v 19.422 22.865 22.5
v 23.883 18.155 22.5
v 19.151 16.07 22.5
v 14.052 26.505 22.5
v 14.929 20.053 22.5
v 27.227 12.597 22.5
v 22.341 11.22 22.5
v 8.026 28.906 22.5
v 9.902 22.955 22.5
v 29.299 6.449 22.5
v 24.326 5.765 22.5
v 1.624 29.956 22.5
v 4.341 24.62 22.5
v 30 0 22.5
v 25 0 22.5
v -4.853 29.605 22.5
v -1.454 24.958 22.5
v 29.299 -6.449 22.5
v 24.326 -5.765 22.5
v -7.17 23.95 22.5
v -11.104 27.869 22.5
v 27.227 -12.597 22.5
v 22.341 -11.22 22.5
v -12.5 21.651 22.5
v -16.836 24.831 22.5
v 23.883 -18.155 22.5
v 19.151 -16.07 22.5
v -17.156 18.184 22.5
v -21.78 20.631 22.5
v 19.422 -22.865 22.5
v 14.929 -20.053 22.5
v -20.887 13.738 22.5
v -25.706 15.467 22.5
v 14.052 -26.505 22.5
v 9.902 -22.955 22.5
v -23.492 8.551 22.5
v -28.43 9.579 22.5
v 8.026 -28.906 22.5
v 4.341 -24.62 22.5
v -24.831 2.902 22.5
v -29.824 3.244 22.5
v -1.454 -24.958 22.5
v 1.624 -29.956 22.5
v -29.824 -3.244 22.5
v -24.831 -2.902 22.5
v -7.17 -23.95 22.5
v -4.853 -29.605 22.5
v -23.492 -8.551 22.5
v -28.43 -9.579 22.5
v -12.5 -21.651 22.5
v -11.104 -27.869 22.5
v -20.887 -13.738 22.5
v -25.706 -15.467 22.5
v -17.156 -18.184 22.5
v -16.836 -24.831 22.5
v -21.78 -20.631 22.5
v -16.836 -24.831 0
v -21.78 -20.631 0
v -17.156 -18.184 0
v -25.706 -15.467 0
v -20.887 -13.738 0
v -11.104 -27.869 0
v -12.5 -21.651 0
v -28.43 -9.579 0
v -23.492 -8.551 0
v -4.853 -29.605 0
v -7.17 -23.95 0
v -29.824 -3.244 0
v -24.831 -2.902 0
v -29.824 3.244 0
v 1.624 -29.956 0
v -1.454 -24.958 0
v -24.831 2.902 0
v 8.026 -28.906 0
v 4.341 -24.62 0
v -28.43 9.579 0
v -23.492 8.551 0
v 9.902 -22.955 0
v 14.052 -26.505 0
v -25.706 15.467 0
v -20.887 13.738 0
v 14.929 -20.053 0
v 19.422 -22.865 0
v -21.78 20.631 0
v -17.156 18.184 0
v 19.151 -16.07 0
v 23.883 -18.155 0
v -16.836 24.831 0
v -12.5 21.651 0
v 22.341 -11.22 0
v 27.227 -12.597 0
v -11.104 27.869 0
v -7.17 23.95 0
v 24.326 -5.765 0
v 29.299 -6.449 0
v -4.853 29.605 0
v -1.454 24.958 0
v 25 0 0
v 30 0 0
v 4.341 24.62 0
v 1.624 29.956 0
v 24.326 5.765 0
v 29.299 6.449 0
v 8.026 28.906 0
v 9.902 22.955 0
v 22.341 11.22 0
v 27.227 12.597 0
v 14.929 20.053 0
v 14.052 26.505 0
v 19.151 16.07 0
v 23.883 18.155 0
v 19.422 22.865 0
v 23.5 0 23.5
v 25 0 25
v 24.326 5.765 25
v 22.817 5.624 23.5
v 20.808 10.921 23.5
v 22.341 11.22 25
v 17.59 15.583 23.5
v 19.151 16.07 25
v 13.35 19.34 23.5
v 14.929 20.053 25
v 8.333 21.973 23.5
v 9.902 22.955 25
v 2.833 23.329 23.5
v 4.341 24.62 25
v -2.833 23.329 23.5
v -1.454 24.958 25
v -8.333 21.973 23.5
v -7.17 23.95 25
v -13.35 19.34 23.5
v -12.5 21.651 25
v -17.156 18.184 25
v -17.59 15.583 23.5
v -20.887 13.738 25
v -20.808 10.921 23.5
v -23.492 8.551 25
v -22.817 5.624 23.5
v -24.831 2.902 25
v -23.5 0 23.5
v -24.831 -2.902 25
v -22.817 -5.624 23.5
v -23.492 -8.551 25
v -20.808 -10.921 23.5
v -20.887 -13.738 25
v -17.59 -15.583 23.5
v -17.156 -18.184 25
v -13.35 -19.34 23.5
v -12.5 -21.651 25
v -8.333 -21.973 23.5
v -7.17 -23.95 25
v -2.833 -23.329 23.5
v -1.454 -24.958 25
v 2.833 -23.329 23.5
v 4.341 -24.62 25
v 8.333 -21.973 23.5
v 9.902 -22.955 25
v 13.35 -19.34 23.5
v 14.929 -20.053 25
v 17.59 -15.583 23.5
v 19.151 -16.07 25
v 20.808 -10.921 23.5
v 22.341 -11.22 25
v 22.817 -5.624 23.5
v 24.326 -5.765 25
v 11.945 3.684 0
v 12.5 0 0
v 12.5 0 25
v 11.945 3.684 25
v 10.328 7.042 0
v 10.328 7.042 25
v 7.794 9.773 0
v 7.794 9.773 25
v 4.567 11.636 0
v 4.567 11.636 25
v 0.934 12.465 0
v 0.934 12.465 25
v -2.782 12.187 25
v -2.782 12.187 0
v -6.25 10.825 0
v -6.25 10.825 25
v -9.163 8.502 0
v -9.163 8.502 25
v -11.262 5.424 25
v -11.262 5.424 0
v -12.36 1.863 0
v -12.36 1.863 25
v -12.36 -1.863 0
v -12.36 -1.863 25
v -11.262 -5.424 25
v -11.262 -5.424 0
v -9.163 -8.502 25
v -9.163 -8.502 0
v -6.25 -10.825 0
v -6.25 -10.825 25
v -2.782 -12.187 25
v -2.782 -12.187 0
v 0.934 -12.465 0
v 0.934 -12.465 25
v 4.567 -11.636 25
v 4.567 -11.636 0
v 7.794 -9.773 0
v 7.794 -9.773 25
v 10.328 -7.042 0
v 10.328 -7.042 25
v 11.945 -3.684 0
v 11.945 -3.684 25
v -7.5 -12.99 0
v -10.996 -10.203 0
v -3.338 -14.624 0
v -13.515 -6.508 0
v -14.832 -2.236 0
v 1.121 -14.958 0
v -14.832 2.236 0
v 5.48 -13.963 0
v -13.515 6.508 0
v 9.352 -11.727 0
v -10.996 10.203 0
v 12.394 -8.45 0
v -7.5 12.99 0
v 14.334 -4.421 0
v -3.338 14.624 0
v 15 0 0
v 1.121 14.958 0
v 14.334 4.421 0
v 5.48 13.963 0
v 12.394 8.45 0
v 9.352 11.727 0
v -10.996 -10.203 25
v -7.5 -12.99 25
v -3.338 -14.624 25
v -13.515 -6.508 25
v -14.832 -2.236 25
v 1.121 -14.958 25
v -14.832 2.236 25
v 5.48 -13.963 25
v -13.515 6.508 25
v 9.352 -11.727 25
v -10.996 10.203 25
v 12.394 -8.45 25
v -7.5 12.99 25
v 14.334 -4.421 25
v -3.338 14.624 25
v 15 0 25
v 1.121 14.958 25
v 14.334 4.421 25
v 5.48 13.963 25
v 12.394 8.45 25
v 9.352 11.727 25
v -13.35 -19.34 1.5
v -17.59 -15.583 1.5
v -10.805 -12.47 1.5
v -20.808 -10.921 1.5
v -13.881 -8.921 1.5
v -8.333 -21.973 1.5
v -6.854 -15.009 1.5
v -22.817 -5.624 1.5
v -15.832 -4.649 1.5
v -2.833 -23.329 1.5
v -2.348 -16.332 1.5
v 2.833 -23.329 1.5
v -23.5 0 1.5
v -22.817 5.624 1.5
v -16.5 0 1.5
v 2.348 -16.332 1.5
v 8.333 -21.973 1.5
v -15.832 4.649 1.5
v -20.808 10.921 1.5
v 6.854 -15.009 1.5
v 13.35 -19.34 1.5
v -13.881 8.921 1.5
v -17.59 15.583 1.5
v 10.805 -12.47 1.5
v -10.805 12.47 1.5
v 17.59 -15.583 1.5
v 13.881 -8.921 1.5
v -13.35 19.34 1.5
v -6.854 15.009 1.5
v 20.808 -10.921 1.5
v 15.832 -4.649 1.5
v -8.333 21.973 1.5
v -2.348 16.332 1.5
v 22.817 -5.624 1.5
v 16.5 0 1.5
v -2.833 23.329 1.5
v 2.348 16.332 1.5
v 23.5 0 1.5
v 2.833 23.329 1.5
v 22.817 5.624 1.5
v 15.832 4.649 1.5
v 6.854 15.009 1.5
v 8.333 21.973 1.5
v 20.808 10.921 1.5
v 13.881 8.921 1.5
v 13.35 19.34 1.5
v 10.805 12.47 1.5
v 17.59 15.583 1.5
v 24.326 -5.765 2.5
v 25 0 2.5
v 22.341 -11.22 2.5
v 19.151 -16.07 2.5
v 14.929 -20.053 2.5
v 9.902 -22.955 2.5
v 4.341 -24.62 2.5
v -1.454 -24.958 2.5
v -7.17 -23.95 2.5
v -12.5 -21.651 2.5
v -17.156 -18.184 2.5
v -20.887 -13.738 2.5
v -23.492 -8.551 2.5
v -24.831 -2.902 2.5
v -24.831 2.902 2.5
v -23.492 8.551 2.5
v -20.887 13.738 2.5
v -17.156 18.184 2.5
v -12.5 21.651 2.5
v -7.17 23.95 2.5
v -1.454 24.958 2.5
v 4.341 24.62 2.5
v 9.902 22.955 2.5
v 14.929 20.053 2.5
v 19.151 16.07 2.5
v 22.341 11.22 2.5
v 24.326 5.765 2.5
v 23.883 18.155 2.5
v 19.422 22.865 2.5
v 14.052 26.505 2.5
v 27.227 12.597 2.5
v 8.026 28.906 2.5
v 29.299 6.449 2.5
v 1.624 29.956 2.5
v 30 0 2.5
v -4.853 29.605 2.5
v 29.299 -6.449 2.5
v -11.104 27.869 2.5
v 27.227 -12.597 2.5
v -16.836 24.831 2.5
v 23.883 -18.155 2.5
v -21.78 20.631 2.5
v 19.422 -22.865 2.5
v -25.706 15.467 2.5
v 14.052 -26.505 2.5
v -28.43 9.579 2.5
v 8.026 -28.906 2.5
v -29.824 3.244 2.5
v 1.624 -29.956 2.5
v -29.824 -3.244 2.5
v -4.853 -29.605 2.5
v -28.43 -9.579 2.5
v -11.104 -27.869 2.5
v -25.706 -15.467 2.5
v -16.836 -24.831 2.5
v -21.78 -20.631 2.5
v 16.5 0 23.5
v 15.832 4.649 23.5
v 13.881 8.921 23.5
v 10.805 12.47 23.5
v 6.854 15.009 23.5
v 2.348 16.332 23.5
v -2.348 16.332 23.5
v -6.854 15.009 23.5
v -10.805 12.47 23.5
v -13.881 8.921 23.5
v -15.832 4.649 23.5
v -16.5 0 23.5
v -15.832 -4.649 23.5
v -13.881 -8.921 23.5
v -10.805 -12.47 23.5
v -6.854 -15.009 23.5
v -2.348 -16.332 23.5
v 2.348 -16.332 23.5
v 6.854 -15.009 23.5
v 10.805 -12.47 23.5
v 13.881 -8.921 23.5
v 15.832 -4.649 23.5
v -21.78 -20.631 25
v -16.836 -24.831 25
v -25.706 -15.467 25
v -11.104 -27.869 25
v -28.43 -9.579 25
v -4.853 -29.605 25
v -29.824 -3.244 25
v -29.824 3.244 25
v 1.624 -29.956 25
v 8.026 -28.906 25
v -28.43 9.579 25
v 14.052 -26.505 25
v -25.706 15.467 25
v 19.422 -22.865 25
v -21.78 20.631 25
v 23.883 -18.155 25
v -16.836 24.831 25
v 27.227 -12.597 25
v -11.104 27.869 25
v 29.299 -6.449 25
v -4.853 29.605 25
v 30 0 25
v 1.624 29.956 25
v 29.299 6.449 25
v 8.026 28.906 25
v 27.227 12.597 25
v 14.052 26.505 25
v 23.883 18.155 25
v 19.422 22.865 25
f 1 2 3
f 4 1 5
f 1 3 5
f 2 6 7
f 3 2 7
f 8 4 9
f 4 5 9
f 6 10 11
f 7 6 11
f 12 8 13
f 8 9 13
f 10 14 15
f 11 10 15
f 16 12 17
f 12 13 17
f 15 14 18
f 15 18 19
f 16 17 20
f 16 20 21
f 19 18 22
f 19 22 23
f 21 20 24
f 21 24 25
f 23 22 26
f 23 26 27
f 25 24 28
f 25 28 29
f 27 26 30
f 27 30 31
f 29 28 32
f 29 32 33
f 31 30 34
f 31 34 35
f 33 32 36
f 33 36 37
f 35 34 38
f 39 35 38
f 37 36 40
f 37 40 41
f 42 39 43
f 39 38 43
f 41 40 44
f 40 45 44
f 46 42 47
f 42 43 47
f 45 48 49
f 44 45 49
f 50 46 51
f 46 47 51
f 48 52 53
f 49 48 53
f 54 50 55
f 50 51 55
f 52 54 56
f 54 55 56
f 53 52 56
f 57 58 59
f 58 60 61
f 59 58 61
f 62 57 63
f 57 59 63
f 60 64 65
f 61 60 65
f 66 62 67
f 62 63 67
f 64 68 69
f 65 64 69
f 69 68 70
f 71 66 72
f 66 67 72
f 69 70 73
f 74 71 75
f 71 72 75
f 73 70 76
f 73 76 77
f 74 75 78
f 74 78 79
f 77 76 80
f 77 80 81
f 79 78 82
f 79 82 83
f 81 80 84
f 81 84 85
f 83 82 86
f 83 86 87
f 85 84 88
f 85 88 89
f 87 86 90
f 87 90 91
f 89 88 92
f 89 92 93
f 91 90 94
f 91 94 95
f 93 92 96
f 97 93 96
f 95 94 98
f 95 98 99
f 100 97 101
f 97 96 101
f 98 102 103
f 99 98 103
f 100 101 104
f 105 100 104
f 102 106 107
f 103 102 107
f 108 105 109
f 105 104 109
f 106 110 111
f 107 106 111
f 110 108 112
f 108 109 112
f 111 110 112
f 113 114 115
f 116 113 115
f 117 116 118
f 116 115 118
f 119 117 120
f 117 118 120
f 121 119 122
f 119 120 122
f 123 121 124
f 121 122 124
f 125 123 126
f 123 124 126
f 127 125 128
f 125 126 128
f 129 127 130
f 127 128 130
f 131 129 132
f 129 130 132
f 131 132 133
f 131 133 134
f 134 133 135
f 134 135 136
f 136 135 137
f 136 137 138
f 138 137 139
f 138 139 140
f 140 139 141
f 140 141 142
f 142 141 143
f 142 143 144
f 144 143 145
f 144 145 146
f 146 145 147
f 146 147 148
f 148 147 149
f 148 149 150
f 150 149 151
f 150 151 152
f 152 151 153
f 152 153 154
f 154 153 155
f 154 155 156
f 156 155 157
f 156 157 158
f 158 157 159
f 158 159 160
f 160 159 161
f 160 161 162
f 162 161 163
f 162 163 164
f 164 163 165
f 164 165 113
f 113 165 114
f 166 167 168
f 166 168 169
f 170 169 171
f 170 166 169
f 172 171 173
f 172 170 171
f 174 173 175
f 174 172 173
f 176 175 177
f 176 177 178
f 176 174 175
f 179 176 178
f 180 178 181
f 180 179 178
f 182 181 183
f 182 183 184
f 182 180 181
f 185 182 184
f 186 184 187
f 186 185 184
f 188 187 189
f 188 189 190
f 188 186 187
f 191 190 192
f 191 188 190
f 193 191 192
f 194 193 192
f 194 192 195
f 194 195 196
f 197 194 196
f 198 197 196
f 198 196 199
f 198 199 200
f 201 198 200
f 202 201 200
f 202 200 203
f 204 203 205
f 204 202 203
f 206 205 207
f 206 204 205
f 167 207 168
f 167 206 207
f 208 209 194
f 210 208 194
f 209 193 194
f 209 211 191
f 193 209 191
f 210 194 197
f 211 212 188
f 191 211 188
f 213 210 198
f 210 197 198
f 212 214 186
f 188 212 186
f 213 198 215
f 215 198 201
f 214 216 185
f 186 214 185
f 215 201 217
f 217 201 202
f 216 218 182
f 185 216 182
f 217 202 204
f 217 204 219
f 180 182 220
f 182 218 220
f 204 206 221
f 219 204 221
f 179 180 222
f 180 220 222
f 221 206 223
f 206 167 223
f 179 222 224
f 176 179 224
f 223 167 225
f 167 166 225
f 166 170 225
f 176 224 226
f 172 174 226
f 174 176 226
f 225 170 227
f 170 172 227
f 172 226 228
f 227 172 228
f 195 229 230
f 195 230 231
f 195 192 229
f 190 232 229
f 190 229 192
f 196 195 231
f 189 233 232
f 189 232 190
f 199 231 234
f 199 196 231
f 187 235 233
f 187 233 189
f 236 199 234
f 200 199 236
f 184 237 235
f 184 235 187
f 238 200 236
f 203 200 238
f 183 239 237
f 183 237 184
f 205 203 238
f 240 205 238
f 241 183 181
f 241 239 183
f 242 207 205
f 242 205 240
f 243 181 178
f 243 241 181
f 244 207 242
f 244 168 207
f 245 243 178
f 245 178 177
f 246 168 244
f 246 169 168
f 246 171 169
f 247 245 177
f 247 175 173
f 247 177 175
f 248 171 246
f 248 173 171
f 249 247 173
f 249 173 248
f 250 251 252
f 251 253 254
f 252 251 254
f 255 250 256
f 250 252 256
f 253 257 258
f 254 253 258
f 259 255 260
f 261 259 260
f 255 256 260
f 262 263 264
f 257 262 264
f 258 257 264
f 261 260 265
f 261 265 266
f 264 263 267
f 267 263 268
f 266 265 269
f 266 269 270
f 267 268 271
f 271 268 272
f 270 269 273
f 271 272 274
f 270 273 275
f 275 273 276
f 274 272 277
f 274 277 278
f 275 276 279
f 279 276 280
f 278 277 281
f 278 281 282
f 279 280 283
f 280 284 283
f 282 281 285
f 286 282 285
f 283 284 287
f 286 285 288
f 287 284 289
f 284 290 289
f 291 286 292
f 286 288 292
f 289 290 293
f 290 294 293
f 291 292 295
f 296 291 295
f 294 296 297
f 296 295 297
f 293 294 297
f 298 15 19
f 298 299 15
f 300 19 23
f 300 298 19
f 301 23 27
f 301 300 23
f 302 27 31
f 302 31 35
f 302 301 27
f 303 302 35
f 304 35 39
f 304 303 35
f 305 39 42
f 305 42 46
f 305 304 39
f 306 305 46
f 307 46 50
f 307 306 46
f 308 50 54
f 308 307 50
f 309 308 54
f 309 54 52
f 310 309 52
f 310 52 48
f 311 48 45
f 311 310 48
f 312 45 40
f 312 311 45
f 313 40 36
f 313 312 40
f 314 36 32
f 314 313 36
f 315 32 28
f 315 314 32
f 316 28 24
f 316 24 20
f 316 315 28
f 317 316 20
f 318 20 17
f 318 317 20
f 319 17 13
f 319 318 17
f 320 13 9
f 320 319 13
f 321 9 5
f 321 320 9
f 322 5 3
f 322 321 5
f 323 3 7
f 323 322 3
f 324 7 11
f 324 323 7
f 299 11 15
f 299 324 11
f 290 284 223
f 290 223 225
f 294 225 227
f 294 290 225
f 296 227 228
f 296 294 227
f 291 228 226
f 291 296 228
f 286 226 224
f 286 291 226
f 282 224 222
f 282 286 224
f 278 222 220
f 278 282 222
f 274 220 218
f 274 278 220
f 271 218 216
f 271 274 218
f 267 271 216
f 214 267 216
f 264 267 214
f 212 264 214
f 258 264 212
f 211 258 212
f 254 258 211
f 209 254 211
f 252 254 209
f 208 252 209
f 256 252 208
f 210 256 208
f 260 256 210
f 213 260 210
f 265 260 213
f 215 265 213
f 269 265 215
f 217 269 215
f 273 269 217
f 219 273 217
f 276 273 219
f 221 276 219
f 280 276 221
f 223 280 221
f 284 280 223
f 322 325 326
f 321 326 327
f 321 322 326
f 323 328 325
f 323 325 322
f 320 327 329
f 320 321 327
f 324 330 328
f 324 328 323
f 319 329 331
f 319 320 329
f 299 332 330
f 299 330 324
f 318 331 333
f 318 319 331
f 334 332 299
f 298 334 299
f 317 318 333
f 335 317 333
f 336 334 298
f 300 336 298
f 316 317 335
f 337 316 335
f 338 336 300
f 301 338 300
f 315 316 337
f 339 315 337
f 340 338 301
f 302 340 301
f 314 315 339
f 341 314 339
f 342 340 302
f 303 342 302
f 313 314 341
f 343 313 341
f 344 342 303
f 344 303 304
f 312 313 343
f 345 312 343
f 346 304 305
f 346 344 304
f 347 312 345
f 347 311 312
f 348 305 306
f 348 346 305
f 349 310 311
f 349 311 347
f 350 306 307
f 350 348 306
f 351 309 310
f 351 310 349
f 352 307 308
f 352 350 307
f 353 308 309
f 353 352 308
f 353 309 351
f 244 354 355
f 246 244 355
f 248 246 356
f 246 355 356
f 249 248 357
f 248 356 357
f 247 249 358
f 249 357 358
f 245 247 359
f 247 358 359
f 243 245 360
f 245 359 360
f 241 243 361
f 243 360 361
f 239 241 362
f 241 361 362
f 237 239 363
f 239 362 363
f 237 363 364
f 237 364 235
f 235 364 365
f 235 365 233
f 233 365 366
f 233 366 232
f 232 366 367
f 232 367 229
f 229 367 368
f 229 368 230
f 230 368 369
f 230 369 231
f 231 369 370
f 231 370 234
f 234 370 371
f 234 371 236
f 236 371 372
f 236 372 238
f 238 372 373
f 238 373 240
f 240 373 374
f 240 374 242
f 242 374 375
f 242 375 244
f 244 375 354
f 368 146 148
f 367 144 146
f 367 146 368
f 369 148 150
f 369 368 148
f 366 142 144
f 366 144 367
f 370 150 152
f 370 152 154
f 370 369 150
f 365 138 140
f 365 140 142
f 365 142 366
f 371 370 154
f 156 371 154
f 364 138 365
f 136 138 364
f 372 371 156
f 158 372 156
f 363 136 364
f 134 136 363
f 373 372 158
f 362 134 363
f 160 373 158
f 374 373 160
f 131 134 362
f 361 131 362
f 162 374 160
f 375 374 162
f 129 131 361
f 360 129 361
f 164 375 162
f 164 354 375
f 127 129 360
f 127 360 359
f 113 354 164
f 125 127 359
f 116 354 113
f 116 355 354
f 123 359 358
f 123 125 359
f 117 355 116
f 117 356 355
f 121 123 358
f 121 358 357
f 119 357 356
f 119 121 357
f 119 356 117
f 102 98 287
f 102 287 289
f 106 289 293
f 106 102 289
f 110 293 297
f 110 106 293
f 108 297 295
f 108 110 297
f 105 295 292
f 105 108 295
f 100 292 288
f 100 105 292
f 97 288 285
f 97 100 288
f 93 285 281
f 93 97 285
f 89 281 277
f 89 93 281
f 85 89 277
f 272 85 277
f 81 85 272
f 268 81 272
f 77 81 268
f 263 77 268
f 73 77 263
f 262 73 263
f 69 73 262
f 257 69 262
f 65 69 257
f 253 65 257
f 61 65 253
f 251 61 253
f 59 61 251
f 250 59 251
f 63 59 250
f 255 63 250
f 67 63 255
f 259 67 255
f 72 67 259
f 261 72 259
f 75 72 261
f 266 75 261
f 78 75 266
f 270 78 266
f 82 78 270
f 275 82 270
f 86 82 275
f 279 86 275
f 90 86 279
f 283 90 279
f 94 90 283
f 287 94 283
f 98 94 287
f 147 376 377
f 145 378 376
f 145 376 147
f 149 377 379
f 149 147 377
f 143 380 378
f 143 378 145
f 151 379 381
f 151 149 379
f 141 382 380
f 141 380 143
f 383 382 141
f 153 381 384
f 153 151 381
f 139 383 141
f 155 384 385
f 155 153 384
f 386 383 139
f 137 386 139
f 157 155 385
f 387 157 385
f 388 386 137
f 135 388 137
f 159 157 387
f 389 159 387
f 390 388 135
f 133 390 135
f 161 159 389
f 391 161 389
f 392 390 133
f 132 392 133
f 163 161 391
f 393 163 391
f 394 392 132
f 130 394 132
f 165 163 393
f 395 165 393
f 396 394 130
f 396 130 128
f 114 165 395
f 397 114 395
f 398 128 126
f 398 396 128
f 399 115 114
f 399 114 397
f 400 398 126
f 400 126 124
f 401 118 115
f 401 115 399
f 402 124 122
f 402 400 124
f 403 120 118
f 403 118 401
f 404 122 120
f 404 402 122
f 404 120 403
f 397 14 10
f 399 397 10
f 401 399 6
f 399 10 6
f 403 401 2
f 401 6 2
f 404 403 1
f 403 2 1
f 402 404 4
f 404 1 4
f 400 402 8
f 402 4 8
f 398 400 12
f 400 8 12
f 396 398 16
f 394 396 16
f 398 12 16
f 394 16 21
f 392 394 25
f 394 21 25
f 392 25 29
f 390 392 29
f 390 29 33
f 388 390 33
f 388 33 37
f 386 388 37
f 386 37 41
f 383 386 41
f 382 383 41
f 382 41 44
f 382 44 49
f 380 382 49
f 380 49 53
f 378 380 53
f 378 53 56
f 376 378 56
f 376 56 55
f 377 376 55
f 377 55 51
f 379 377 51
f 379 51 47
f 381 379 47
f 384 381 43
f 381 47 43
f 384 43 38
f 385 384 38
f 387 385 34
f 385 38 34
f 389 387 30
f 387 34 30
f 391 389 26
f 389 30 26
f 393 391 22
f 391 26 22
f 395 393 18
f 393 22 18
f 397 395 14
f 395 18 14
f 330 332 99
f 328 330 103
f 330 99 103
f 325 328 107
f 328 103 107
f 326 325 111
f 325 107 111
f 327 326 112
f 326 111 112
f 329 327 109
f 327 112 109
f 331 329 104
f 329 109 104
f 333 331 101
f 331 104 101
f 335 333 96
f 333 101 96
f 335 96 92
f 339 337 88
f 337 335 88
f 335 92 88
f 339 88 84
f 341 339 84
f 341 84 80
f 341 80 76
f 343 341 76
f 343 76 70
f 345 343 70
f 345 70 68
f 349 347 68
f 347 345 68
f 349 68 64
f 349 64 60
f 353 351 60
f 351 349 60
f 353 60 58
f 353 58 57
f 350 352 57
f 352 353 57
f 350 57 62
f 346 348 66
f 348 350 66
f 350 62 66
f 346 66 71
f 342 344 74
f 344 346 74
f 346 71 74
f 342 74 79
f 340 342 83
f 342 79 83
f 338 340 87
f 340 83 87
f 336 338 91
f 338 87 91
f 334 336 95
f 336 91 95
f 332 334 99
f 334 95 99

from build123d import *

# Parameters (mm, degrees)
CROQUIS1_R                 = 30
CROQUIS1_R_2               = 12.5
SALIENTE_EXTRUIR1_DEPTH    = 25
CROQUIS3_W                 = 20
CROQUIS3_H                 = 10
CROQUIS4_R                 = 25
CROQUIS4_R_2               = 15
CORTAR_EXTRUIR1_DEPTH      = 1.5
CHAFL_N2_SIZE              = 1.5
CHAFL_N2_OF_SIMETR_A2_SIZE = 1.5


with BuildPart() as part:
    # Croquis1 → Saliente-Extruir1 (new body)
    with BuildSketch(Plane.XY):
        Circle(CROQUIS1_R)
        Circle(CROQUIS1_R_2, mode=Mode.SUBTRACT)
    extrude(amount=SALIENTE_EXTRUIR1_DEPTH)

    # Croquis3 → Cortar-Revolución1 (revolve, cut)
    with BuildSketch(Plane(origin=(0, 0, 0), x_dir=(0, 0, -1), z_dir=(1, 0, 0)), mode=Mode.PRIVATE) as cortar_revoluci_n1_sk:
        with Locations((-12.5, 30)):
            Rectangle(CROQUIS3_W, CROQUIS3_H)
    revolve(cortar_revoluci_n1_sk.sketch.rotate(Axis((0, 0, 25), (0, 0, -1)), 90), axis=Axis((0, 0, 25), (0, 0, -1)), mode=Mode.SUBTRACT)

    # Croquis4 → Cortar-Extruir1 (cut)
    with BuildSketch(Plane.XY.offset(25)):
        Circle(CROQUIS4_R)
        Circle(CROQUIS4_R_2, mode=Mode.SUBTRACT)
    cortar_extruir1 = extrude(amount=-CORTAR_EXTRUIR1_DEPTH, mode=Mode.SUBTRACT)

    # Chaflán2
    chafl_n2_edges = [part.edges().sort_by_distance(p)[0] for p in [
        (-25, 0, 23.5),
        (-15, 0, 23.5),
    ]]
    chamfer(chafl_n2_edges, length=CHAFL_N2_SIZE - 0.0001)  # a hair under: the kernel refuses the full size

    # Simetría2: Cortar-Extruir1 across plane
    add(cortar_extruir1.mirror(Plane.XY.offset(12.5)), mode=Mode.SUBTRACT)

    # Chaflán2 of Simetría2
    chafl_n2_of_simetr_a2_edges = [part.edges().sort_by_distance(p)[0] for p in [
        (-25, 0, 1.5),
        (-15, 0, 1.5),
    ]]
    chamfer(chafl_n2_of_simetr_a2_edges, length=CHAFL_N2_OF_SIMETR_A2_SIZE - 0.0001)  # a hair under: the kernel refuses the full size


solid = part.part
